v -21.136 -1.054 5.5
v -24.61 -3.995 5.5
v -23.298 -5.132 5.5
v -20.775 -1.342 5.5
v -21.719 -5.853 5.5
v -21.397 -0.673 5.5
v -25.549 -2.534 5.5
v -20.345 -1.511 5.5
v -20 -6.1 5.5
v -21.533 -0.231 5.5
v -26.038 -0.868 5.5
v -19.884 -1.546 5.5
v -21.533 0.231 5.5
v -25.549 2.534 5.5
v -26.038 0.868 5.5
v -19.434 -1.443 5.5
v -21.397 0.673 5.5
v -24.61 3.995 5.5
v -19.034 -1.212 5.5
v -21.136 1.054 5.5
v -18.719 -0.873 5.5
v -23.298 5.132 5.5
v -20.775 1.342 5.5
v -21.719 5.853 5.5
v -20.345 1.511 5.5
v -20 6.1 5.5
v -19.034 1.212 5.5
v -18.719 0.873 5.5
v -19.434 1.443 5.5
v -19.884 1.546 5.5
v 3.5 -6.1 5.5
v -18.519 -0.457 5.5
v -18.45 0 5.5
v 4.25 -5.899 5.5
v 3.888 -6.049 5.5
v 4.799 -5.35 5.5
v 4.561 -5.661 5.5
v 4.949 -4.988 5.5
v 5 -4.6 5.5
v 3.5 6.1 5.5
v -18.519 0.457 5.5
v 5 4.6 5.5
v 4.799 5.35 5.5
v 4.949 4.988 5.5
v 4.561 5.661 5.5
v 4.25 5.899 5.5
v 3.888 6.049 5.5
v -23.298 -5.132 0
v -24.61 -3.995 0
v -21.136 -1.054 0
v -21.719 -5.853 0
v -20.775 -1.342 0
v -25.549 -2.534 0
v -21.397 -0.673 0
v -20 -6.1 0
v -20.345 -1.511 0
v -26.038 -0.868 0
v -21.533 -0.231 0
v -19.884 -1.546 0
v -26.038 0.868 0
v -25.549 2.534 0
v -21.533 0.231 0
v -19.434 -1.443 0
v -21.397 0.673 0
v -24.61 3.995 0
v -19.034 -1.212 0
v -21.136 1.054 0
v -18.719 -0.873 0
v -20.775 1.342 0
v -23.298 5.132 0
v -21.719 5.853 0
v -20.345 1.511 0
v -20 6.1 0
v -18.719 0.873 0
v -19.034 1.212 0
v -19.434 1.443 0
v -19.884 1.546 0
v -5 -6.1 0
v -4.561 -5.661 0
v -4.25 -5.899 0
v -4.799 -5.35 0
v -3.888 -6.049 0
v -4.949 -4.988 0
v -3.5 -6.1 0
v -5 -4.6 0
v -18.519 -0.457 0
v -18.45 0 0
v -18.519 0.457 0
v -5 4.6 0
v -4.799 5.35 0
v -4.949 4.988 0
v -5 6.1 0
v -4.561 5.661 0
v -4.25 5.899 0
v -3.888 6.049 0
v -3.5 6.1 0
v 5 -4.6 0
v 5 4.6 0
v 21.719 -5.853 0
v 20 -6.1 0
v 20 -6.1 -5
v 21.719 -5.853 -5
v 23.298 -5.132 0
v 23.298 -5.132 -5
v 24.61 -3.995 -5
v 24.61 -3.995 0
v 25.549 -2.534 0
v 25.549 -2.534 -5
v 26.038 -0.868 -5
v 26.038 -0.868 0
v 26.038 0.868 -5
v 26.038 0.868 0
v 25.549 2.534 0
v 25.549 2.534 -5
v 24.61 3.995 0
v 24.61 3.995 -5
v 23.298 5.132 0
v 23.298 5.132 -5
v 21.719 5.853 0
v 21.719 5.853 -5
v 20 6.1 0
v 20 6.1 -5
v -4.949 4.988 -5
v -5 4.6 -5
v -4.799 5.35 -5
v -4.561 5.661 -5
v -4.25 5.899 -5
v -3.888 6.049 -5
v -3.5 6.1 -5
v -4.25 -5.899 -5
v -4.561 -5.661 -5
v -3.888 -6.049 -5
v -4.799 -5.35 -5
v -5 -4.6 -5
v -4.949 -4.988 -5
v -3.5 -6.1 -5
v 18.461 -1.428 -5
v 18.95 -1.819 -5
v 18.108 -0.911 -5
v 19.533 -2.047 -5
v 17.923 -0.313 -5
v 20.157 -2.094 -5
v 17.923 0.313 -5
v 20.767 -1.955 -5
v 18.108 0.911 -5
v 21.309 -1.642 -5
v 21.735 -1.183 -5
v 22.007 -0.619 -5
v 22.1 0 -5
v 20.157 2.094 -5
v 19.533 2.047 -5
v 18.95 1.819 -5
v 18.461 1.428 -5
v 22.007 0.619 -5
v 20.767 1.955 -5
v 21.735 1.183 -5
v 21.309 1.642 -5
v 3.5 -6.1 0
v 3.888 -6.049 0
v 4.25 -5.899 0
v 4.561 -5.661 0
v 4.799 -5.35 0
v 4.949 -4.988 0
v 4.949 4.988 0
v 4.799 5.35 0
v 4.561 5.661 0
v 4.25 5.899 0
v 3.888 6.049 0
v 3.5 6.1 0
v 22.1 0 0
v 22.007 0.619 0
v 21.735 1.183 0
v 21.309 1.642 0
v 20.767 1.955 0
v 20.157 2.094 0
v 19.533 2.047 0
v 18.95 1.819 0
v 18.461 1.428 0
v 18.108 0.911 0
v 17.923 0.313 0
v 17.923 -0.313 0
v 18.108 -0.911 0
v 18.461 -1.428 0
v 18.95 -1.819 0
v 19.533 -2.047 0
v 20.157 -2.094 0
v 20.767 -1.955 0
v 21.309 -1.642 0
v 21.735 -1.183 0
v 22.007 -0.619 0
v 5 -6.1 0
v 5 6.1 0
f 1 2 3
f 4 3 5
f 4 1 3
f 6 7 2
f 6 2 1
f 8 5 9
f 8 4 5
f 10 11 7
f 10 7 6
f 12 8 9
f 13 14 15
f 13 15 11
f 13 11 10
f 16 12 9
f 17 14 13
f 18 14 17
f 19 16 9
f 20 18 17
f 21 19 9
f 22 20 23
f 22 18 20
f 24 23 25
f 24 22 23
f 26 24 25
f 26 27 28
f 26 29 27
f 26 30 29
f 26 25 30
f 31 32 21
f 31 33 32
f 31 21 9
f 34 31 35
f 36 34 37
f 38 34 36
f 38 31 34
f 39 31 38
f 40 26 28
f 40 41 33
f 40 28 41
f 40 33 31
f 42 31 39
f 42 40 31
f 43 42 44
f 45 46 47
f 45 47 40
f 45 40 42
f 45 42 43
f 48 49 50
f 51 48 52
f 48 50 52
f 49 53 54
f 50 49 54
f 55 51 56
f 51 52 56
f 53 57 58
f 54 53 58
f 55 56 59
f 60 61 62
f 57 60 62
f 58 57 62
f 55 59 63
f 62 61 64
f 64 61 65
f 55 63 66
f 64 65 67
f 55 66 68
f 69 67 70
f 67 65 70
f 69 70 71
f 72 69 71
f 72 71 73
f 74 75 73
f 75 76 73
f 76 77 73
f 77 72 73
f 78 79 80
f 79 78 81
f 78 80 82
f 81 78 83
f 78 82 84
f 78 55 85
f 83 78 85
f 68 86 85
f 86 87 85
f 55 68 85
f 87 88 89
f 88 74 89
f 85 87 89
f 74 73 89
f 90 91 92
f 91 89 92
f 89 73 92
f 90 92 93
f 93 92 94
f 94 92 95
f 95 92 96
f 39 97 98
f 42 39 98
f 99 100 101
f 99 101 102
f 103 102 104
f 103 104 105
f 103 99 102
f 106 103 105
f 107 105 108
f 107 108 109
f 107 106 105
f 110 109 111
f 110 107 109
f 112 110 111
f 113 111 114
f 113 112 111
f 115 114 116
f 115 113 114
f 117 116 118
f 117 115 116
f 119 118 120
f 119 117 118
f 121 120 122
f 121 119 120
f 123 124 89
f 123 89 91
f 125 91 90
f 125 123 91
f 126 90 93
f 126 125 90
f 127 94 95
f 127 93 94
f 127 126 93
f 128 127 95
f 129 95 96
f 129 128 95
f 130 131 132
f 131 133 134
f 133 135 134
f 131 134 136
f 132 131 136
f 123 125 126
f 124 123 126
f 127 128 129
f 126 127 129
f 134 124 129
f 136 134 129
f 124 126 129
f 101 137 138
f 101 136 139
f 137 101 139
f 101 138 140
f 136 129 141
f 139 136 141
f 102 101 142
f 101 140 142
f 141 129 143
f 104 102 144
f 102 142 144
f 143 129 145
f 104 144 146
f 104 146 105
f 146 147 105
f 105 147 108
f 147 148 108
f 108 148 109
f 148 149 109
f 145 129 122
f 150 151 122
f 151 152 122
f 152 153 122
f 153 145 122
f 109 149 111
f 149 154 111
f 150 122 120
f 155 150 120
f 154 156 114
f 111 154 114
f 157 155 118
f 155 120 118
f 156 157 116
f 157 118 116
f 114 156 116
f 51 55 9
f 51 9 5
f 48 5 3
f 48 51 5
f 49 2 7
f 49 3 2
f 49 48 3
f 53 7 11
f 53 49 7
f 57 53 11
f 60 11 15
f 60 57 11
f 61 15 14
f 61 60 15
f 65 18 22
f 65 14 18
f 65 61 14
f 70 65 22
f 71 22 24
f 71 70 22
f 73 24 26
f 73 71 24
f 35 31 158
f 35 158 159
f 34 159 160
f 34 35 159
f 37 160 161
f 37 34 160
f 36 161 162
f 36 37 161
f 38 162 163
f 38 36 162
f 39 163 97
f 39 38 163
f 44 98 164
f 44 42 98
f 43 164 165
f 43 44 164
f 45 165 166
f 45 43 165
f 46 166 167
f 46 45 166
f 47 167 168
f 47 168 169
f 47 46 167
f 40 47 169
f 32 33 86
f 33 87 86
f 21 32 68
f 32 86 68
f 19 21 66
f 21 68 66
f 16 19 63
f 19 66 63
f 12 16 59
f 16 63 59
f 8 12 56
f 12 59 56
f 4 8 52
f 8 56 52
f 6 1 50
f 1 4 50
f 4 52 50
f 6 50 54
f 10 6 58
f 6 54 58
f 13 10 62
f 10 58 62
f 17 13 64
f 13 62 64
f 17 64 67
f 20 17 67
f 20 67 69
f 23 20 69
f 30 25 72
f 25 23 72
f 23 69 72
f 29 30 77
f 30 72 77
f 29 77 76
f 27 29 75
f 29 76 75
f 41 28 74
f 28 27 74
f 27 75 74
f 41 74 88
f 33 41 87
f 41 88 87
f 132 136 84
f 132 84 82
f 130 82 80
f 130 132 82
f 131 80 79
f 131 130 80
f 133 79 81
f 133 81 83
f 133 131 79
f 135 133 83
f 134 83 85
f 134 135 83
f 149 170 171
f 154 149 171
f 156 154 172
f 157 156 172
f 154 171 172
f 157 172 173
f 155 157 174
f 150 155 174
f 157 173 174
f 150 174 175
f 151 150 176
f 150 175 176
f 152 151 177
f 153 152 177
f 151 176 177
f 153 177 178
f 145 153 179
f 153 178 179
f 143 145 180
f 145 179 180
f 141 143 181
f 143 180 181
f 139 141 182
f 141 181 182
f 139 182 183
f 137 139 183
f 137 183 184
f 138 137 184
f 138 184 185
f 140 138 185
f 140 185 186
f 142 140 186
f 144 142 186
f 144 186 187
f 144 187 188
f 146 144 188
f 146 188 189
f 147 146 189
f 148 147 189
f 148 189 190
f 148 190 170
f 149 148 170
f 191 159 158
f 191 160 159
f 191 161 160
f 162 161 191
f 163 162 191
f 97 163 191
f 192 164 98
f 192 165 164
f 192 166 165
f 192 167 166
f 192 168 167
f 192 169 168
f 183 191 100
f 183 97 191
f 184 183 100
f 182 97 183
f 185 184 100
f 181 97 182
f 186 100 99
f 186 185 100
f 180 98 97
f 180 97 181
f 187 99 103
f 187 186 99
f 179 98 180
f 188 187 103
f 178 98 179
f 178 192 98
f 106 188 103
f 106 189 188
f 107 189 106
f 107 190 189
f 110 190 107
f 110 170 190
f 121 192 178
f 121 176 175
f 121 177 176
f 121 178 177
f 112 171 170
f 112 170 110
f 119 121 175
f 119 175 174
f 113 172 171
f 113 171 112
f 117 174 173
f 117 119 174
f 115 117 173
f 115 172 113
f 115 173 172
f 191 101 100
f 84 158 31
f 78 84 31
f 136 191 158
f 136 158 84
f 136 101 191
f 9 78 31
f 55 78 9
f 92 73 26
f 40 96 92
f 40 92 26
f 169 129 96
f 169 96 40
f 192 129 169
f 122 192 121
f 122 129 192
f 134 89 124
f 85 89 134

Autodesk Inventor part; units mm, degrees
ref_plane "YZ Plane" through (0, 0, 0) normal (1, 0, 0) x (0, 1, 0)
ref_plane "XZ Plane" through (0, 0, 0) normal (0, 1, 0) x (-1, 0, 0)
ref_plane "XY Plane" through (0, 0, 0) normal (0, 0, 1) x (1, 0, 0)
sketch "Esquisse1" plane through (0, 0, 0) normal (0, 0, 1) x (1, 0, 0)
  line L0 (20, 0) -> (-20, 0) construction
  line L1 (20, -6.1) -> (-20, -6.1)
  line L2 (-20, 6.1) -> (20, 6.1)
  arc A0 (20, -6.1) -> (20, 6.1) centre (20, 0) ccw
  arc A1 (-20, 6.1) -> (-20, -6.1) centre (-20, 0) ccw
  circle A2 centre (-20, 0) radius 1.55
  circle A3 centre (20, 0) radius 2.1
  line L3 (-5, -6.1) -> (5, -6.1)
  line L4 (5, -6.1) -> (5, 6.1)
  line L5 (5, 6.1) -> (-5, 6.1)
  line L6 (-5, 6.1) -> (-5, -6.1)
  line L7 (-5, -6.1) -> (5, 6.1) construction
  line L8 (5, -6.1) -> (-5, 6.1) construction
  point P0 (0, 0)
  dimension "d0" = 40
  dimension "d1" = 3.1
  dimension "d5" = 4.2
  dimension "d6" = 4
  dimension "d12" = 10
extrude "Extrusion1" add sketch "Esquisse1" along normal blind 5.5 contours L1 L6 L2 L4 | L1 A1 L2 L6
extrude "Extrusion4" add sketch "Esquisse1" against normal blind 5 contours L1 L4 L2 A0 | L1 L6 L2 L4
fillet "Congé1" radius 1.5 4 edges at (-5, 6.1, -2.5) (-5, -6.1, -2.5) (5, -6.1, 2.75) (5, 6.1, 2.75)
properties part number "Biellette support-doigts"
